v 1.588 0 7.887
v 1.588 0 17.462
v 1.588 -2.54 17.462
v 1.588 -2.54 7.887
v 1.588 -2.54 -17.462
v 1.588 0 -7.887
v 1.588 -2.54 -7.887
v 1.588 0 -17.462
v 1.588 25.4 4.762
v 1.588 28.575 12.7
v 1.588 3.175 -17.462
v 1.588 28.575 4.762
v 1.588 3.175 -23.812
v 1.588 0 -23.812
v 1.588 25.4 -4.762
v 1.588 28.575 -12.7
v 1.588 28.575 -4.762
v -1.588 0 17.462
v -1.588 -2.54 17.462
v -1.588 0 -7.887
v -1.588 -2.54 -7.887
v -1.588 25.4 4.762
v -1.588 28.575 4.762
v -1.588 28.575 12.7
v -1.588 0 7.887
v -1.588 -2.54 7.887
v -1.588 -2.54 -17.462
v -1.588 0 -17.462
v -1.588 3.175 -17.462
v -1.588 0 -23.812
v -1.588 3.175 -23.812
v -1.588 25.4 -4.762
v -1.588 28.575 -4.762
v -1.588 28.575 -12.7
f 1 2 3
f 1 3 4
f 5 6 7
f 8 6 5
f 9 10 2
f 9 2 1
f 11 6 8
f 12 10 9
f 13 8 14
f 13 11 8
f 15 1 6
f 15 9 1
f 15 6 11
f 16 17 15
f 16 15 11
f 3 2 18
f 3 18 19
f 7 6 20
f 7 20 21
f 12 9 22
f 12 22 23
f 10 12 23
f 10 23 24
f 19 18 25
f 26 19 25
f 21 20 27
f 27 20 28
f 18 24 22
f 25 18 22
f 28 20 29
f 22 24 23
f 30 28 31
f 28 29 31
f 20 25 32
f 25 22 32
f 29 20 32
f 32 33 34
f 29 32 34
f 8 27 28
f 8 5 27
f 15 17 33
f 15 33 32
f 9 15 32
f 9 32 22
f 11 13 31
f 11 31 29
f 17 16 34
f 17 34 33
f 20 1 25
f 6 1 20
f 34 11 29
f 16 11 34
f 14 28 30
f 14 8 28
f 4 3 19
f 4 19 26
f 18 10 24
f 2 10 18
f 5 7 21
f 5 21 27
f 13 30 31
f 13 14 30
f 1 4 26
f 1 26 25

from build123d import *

# Parameters (mm, degrees)
BOSS_EXTRUDE1_DEPTH = 1.5875


with BuildPart() as part:
    # Sketch1 → Boss-Extrude1 (new body, symmetric)
    with BuildSketch(Plane(origin=(0, 0, 0), x_dir=(0, 0, -1), z_dir=(1, 0, 0))):
        Polygon((23.8125, 0), (23.8125, 3.175), (17.4625, 3.175), (12.7, 28.575), (4.7625, 28.575), (4.7625, 25.4), (-4.7625, 25.4), (-4.7625, 28.575), (-12.7, 28.575), (-17.4625, 0), (-17.4625, -2.54), (-7.8867, -2.54), (-7.8867, 0), (7.8867, 0), (7.8867, -2.54), (17.4625, -2.54), (17.4625, 0), align=None)
    extrude(amount=BOSS_EXTRUDE1_DEPTH, both=True)


solid = part.part
